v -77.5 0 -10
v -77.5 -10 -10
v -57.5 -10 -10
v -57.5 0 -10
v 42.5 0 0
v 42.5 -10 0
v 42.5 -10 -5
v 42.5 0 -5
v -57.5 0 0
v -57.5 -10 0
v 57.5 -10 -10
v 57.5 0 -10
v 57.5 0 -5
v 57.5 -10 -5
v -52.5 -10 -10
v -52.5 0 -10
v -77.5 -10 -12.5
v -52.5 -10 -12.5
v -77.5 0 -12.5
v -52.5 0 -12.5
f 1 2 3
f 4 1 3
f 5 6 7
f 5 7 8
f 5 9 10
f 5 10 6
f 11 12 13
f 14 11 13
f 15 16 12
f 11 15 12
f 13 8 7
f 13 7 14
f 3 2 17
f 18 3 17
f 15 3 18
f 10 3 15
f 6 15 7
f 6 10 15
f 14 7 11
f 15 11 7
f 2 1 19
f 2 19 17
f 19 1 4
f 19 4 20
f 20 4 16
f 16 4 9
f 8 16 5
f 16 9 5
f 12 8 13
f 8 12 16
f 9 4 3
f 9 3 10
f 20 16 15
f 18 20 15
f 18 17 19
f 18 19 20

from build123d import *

# Parameters (mm, degrees)
F0_W     = 115
F0_H     = 10
F1_DEPTH = 10
F2_W     = 15
F2_H     = 10
F3_DEPTH = 5
F4_W     = 25
F4_H     = 10
F5_DEPTH = 2.5


with BuildPart() as f1:
    # F0 (on Front) → F1 (new body)
    with BuildSketch(Plane.XZ):
        with Locations((0, -5)):
            Rectangle(F0_W, F0_H)
    extrude(amount=F1_DEPTH)

    # F2 (on face) → F3 (cut)
    with BuildSketch(Plane.XY):
        with Locations((50, -5)):
            Rectangle(F2_W, F2_H)
    extrude(amount=-F3_DEPTH, mode=Mode.SUBTRACT)

    # F4 (on face) → F5 (join)
    with BuildSketch(Plane(origin=(0, 0, -10), x_dir=(1, 0, 0), z_dir=(0, 0, -1))):
        with Locations((-65, 5)):
            Rectangle(F4_W, F4_H)
    extrude(amount=F5_DEPTH)


solid = f1.part
